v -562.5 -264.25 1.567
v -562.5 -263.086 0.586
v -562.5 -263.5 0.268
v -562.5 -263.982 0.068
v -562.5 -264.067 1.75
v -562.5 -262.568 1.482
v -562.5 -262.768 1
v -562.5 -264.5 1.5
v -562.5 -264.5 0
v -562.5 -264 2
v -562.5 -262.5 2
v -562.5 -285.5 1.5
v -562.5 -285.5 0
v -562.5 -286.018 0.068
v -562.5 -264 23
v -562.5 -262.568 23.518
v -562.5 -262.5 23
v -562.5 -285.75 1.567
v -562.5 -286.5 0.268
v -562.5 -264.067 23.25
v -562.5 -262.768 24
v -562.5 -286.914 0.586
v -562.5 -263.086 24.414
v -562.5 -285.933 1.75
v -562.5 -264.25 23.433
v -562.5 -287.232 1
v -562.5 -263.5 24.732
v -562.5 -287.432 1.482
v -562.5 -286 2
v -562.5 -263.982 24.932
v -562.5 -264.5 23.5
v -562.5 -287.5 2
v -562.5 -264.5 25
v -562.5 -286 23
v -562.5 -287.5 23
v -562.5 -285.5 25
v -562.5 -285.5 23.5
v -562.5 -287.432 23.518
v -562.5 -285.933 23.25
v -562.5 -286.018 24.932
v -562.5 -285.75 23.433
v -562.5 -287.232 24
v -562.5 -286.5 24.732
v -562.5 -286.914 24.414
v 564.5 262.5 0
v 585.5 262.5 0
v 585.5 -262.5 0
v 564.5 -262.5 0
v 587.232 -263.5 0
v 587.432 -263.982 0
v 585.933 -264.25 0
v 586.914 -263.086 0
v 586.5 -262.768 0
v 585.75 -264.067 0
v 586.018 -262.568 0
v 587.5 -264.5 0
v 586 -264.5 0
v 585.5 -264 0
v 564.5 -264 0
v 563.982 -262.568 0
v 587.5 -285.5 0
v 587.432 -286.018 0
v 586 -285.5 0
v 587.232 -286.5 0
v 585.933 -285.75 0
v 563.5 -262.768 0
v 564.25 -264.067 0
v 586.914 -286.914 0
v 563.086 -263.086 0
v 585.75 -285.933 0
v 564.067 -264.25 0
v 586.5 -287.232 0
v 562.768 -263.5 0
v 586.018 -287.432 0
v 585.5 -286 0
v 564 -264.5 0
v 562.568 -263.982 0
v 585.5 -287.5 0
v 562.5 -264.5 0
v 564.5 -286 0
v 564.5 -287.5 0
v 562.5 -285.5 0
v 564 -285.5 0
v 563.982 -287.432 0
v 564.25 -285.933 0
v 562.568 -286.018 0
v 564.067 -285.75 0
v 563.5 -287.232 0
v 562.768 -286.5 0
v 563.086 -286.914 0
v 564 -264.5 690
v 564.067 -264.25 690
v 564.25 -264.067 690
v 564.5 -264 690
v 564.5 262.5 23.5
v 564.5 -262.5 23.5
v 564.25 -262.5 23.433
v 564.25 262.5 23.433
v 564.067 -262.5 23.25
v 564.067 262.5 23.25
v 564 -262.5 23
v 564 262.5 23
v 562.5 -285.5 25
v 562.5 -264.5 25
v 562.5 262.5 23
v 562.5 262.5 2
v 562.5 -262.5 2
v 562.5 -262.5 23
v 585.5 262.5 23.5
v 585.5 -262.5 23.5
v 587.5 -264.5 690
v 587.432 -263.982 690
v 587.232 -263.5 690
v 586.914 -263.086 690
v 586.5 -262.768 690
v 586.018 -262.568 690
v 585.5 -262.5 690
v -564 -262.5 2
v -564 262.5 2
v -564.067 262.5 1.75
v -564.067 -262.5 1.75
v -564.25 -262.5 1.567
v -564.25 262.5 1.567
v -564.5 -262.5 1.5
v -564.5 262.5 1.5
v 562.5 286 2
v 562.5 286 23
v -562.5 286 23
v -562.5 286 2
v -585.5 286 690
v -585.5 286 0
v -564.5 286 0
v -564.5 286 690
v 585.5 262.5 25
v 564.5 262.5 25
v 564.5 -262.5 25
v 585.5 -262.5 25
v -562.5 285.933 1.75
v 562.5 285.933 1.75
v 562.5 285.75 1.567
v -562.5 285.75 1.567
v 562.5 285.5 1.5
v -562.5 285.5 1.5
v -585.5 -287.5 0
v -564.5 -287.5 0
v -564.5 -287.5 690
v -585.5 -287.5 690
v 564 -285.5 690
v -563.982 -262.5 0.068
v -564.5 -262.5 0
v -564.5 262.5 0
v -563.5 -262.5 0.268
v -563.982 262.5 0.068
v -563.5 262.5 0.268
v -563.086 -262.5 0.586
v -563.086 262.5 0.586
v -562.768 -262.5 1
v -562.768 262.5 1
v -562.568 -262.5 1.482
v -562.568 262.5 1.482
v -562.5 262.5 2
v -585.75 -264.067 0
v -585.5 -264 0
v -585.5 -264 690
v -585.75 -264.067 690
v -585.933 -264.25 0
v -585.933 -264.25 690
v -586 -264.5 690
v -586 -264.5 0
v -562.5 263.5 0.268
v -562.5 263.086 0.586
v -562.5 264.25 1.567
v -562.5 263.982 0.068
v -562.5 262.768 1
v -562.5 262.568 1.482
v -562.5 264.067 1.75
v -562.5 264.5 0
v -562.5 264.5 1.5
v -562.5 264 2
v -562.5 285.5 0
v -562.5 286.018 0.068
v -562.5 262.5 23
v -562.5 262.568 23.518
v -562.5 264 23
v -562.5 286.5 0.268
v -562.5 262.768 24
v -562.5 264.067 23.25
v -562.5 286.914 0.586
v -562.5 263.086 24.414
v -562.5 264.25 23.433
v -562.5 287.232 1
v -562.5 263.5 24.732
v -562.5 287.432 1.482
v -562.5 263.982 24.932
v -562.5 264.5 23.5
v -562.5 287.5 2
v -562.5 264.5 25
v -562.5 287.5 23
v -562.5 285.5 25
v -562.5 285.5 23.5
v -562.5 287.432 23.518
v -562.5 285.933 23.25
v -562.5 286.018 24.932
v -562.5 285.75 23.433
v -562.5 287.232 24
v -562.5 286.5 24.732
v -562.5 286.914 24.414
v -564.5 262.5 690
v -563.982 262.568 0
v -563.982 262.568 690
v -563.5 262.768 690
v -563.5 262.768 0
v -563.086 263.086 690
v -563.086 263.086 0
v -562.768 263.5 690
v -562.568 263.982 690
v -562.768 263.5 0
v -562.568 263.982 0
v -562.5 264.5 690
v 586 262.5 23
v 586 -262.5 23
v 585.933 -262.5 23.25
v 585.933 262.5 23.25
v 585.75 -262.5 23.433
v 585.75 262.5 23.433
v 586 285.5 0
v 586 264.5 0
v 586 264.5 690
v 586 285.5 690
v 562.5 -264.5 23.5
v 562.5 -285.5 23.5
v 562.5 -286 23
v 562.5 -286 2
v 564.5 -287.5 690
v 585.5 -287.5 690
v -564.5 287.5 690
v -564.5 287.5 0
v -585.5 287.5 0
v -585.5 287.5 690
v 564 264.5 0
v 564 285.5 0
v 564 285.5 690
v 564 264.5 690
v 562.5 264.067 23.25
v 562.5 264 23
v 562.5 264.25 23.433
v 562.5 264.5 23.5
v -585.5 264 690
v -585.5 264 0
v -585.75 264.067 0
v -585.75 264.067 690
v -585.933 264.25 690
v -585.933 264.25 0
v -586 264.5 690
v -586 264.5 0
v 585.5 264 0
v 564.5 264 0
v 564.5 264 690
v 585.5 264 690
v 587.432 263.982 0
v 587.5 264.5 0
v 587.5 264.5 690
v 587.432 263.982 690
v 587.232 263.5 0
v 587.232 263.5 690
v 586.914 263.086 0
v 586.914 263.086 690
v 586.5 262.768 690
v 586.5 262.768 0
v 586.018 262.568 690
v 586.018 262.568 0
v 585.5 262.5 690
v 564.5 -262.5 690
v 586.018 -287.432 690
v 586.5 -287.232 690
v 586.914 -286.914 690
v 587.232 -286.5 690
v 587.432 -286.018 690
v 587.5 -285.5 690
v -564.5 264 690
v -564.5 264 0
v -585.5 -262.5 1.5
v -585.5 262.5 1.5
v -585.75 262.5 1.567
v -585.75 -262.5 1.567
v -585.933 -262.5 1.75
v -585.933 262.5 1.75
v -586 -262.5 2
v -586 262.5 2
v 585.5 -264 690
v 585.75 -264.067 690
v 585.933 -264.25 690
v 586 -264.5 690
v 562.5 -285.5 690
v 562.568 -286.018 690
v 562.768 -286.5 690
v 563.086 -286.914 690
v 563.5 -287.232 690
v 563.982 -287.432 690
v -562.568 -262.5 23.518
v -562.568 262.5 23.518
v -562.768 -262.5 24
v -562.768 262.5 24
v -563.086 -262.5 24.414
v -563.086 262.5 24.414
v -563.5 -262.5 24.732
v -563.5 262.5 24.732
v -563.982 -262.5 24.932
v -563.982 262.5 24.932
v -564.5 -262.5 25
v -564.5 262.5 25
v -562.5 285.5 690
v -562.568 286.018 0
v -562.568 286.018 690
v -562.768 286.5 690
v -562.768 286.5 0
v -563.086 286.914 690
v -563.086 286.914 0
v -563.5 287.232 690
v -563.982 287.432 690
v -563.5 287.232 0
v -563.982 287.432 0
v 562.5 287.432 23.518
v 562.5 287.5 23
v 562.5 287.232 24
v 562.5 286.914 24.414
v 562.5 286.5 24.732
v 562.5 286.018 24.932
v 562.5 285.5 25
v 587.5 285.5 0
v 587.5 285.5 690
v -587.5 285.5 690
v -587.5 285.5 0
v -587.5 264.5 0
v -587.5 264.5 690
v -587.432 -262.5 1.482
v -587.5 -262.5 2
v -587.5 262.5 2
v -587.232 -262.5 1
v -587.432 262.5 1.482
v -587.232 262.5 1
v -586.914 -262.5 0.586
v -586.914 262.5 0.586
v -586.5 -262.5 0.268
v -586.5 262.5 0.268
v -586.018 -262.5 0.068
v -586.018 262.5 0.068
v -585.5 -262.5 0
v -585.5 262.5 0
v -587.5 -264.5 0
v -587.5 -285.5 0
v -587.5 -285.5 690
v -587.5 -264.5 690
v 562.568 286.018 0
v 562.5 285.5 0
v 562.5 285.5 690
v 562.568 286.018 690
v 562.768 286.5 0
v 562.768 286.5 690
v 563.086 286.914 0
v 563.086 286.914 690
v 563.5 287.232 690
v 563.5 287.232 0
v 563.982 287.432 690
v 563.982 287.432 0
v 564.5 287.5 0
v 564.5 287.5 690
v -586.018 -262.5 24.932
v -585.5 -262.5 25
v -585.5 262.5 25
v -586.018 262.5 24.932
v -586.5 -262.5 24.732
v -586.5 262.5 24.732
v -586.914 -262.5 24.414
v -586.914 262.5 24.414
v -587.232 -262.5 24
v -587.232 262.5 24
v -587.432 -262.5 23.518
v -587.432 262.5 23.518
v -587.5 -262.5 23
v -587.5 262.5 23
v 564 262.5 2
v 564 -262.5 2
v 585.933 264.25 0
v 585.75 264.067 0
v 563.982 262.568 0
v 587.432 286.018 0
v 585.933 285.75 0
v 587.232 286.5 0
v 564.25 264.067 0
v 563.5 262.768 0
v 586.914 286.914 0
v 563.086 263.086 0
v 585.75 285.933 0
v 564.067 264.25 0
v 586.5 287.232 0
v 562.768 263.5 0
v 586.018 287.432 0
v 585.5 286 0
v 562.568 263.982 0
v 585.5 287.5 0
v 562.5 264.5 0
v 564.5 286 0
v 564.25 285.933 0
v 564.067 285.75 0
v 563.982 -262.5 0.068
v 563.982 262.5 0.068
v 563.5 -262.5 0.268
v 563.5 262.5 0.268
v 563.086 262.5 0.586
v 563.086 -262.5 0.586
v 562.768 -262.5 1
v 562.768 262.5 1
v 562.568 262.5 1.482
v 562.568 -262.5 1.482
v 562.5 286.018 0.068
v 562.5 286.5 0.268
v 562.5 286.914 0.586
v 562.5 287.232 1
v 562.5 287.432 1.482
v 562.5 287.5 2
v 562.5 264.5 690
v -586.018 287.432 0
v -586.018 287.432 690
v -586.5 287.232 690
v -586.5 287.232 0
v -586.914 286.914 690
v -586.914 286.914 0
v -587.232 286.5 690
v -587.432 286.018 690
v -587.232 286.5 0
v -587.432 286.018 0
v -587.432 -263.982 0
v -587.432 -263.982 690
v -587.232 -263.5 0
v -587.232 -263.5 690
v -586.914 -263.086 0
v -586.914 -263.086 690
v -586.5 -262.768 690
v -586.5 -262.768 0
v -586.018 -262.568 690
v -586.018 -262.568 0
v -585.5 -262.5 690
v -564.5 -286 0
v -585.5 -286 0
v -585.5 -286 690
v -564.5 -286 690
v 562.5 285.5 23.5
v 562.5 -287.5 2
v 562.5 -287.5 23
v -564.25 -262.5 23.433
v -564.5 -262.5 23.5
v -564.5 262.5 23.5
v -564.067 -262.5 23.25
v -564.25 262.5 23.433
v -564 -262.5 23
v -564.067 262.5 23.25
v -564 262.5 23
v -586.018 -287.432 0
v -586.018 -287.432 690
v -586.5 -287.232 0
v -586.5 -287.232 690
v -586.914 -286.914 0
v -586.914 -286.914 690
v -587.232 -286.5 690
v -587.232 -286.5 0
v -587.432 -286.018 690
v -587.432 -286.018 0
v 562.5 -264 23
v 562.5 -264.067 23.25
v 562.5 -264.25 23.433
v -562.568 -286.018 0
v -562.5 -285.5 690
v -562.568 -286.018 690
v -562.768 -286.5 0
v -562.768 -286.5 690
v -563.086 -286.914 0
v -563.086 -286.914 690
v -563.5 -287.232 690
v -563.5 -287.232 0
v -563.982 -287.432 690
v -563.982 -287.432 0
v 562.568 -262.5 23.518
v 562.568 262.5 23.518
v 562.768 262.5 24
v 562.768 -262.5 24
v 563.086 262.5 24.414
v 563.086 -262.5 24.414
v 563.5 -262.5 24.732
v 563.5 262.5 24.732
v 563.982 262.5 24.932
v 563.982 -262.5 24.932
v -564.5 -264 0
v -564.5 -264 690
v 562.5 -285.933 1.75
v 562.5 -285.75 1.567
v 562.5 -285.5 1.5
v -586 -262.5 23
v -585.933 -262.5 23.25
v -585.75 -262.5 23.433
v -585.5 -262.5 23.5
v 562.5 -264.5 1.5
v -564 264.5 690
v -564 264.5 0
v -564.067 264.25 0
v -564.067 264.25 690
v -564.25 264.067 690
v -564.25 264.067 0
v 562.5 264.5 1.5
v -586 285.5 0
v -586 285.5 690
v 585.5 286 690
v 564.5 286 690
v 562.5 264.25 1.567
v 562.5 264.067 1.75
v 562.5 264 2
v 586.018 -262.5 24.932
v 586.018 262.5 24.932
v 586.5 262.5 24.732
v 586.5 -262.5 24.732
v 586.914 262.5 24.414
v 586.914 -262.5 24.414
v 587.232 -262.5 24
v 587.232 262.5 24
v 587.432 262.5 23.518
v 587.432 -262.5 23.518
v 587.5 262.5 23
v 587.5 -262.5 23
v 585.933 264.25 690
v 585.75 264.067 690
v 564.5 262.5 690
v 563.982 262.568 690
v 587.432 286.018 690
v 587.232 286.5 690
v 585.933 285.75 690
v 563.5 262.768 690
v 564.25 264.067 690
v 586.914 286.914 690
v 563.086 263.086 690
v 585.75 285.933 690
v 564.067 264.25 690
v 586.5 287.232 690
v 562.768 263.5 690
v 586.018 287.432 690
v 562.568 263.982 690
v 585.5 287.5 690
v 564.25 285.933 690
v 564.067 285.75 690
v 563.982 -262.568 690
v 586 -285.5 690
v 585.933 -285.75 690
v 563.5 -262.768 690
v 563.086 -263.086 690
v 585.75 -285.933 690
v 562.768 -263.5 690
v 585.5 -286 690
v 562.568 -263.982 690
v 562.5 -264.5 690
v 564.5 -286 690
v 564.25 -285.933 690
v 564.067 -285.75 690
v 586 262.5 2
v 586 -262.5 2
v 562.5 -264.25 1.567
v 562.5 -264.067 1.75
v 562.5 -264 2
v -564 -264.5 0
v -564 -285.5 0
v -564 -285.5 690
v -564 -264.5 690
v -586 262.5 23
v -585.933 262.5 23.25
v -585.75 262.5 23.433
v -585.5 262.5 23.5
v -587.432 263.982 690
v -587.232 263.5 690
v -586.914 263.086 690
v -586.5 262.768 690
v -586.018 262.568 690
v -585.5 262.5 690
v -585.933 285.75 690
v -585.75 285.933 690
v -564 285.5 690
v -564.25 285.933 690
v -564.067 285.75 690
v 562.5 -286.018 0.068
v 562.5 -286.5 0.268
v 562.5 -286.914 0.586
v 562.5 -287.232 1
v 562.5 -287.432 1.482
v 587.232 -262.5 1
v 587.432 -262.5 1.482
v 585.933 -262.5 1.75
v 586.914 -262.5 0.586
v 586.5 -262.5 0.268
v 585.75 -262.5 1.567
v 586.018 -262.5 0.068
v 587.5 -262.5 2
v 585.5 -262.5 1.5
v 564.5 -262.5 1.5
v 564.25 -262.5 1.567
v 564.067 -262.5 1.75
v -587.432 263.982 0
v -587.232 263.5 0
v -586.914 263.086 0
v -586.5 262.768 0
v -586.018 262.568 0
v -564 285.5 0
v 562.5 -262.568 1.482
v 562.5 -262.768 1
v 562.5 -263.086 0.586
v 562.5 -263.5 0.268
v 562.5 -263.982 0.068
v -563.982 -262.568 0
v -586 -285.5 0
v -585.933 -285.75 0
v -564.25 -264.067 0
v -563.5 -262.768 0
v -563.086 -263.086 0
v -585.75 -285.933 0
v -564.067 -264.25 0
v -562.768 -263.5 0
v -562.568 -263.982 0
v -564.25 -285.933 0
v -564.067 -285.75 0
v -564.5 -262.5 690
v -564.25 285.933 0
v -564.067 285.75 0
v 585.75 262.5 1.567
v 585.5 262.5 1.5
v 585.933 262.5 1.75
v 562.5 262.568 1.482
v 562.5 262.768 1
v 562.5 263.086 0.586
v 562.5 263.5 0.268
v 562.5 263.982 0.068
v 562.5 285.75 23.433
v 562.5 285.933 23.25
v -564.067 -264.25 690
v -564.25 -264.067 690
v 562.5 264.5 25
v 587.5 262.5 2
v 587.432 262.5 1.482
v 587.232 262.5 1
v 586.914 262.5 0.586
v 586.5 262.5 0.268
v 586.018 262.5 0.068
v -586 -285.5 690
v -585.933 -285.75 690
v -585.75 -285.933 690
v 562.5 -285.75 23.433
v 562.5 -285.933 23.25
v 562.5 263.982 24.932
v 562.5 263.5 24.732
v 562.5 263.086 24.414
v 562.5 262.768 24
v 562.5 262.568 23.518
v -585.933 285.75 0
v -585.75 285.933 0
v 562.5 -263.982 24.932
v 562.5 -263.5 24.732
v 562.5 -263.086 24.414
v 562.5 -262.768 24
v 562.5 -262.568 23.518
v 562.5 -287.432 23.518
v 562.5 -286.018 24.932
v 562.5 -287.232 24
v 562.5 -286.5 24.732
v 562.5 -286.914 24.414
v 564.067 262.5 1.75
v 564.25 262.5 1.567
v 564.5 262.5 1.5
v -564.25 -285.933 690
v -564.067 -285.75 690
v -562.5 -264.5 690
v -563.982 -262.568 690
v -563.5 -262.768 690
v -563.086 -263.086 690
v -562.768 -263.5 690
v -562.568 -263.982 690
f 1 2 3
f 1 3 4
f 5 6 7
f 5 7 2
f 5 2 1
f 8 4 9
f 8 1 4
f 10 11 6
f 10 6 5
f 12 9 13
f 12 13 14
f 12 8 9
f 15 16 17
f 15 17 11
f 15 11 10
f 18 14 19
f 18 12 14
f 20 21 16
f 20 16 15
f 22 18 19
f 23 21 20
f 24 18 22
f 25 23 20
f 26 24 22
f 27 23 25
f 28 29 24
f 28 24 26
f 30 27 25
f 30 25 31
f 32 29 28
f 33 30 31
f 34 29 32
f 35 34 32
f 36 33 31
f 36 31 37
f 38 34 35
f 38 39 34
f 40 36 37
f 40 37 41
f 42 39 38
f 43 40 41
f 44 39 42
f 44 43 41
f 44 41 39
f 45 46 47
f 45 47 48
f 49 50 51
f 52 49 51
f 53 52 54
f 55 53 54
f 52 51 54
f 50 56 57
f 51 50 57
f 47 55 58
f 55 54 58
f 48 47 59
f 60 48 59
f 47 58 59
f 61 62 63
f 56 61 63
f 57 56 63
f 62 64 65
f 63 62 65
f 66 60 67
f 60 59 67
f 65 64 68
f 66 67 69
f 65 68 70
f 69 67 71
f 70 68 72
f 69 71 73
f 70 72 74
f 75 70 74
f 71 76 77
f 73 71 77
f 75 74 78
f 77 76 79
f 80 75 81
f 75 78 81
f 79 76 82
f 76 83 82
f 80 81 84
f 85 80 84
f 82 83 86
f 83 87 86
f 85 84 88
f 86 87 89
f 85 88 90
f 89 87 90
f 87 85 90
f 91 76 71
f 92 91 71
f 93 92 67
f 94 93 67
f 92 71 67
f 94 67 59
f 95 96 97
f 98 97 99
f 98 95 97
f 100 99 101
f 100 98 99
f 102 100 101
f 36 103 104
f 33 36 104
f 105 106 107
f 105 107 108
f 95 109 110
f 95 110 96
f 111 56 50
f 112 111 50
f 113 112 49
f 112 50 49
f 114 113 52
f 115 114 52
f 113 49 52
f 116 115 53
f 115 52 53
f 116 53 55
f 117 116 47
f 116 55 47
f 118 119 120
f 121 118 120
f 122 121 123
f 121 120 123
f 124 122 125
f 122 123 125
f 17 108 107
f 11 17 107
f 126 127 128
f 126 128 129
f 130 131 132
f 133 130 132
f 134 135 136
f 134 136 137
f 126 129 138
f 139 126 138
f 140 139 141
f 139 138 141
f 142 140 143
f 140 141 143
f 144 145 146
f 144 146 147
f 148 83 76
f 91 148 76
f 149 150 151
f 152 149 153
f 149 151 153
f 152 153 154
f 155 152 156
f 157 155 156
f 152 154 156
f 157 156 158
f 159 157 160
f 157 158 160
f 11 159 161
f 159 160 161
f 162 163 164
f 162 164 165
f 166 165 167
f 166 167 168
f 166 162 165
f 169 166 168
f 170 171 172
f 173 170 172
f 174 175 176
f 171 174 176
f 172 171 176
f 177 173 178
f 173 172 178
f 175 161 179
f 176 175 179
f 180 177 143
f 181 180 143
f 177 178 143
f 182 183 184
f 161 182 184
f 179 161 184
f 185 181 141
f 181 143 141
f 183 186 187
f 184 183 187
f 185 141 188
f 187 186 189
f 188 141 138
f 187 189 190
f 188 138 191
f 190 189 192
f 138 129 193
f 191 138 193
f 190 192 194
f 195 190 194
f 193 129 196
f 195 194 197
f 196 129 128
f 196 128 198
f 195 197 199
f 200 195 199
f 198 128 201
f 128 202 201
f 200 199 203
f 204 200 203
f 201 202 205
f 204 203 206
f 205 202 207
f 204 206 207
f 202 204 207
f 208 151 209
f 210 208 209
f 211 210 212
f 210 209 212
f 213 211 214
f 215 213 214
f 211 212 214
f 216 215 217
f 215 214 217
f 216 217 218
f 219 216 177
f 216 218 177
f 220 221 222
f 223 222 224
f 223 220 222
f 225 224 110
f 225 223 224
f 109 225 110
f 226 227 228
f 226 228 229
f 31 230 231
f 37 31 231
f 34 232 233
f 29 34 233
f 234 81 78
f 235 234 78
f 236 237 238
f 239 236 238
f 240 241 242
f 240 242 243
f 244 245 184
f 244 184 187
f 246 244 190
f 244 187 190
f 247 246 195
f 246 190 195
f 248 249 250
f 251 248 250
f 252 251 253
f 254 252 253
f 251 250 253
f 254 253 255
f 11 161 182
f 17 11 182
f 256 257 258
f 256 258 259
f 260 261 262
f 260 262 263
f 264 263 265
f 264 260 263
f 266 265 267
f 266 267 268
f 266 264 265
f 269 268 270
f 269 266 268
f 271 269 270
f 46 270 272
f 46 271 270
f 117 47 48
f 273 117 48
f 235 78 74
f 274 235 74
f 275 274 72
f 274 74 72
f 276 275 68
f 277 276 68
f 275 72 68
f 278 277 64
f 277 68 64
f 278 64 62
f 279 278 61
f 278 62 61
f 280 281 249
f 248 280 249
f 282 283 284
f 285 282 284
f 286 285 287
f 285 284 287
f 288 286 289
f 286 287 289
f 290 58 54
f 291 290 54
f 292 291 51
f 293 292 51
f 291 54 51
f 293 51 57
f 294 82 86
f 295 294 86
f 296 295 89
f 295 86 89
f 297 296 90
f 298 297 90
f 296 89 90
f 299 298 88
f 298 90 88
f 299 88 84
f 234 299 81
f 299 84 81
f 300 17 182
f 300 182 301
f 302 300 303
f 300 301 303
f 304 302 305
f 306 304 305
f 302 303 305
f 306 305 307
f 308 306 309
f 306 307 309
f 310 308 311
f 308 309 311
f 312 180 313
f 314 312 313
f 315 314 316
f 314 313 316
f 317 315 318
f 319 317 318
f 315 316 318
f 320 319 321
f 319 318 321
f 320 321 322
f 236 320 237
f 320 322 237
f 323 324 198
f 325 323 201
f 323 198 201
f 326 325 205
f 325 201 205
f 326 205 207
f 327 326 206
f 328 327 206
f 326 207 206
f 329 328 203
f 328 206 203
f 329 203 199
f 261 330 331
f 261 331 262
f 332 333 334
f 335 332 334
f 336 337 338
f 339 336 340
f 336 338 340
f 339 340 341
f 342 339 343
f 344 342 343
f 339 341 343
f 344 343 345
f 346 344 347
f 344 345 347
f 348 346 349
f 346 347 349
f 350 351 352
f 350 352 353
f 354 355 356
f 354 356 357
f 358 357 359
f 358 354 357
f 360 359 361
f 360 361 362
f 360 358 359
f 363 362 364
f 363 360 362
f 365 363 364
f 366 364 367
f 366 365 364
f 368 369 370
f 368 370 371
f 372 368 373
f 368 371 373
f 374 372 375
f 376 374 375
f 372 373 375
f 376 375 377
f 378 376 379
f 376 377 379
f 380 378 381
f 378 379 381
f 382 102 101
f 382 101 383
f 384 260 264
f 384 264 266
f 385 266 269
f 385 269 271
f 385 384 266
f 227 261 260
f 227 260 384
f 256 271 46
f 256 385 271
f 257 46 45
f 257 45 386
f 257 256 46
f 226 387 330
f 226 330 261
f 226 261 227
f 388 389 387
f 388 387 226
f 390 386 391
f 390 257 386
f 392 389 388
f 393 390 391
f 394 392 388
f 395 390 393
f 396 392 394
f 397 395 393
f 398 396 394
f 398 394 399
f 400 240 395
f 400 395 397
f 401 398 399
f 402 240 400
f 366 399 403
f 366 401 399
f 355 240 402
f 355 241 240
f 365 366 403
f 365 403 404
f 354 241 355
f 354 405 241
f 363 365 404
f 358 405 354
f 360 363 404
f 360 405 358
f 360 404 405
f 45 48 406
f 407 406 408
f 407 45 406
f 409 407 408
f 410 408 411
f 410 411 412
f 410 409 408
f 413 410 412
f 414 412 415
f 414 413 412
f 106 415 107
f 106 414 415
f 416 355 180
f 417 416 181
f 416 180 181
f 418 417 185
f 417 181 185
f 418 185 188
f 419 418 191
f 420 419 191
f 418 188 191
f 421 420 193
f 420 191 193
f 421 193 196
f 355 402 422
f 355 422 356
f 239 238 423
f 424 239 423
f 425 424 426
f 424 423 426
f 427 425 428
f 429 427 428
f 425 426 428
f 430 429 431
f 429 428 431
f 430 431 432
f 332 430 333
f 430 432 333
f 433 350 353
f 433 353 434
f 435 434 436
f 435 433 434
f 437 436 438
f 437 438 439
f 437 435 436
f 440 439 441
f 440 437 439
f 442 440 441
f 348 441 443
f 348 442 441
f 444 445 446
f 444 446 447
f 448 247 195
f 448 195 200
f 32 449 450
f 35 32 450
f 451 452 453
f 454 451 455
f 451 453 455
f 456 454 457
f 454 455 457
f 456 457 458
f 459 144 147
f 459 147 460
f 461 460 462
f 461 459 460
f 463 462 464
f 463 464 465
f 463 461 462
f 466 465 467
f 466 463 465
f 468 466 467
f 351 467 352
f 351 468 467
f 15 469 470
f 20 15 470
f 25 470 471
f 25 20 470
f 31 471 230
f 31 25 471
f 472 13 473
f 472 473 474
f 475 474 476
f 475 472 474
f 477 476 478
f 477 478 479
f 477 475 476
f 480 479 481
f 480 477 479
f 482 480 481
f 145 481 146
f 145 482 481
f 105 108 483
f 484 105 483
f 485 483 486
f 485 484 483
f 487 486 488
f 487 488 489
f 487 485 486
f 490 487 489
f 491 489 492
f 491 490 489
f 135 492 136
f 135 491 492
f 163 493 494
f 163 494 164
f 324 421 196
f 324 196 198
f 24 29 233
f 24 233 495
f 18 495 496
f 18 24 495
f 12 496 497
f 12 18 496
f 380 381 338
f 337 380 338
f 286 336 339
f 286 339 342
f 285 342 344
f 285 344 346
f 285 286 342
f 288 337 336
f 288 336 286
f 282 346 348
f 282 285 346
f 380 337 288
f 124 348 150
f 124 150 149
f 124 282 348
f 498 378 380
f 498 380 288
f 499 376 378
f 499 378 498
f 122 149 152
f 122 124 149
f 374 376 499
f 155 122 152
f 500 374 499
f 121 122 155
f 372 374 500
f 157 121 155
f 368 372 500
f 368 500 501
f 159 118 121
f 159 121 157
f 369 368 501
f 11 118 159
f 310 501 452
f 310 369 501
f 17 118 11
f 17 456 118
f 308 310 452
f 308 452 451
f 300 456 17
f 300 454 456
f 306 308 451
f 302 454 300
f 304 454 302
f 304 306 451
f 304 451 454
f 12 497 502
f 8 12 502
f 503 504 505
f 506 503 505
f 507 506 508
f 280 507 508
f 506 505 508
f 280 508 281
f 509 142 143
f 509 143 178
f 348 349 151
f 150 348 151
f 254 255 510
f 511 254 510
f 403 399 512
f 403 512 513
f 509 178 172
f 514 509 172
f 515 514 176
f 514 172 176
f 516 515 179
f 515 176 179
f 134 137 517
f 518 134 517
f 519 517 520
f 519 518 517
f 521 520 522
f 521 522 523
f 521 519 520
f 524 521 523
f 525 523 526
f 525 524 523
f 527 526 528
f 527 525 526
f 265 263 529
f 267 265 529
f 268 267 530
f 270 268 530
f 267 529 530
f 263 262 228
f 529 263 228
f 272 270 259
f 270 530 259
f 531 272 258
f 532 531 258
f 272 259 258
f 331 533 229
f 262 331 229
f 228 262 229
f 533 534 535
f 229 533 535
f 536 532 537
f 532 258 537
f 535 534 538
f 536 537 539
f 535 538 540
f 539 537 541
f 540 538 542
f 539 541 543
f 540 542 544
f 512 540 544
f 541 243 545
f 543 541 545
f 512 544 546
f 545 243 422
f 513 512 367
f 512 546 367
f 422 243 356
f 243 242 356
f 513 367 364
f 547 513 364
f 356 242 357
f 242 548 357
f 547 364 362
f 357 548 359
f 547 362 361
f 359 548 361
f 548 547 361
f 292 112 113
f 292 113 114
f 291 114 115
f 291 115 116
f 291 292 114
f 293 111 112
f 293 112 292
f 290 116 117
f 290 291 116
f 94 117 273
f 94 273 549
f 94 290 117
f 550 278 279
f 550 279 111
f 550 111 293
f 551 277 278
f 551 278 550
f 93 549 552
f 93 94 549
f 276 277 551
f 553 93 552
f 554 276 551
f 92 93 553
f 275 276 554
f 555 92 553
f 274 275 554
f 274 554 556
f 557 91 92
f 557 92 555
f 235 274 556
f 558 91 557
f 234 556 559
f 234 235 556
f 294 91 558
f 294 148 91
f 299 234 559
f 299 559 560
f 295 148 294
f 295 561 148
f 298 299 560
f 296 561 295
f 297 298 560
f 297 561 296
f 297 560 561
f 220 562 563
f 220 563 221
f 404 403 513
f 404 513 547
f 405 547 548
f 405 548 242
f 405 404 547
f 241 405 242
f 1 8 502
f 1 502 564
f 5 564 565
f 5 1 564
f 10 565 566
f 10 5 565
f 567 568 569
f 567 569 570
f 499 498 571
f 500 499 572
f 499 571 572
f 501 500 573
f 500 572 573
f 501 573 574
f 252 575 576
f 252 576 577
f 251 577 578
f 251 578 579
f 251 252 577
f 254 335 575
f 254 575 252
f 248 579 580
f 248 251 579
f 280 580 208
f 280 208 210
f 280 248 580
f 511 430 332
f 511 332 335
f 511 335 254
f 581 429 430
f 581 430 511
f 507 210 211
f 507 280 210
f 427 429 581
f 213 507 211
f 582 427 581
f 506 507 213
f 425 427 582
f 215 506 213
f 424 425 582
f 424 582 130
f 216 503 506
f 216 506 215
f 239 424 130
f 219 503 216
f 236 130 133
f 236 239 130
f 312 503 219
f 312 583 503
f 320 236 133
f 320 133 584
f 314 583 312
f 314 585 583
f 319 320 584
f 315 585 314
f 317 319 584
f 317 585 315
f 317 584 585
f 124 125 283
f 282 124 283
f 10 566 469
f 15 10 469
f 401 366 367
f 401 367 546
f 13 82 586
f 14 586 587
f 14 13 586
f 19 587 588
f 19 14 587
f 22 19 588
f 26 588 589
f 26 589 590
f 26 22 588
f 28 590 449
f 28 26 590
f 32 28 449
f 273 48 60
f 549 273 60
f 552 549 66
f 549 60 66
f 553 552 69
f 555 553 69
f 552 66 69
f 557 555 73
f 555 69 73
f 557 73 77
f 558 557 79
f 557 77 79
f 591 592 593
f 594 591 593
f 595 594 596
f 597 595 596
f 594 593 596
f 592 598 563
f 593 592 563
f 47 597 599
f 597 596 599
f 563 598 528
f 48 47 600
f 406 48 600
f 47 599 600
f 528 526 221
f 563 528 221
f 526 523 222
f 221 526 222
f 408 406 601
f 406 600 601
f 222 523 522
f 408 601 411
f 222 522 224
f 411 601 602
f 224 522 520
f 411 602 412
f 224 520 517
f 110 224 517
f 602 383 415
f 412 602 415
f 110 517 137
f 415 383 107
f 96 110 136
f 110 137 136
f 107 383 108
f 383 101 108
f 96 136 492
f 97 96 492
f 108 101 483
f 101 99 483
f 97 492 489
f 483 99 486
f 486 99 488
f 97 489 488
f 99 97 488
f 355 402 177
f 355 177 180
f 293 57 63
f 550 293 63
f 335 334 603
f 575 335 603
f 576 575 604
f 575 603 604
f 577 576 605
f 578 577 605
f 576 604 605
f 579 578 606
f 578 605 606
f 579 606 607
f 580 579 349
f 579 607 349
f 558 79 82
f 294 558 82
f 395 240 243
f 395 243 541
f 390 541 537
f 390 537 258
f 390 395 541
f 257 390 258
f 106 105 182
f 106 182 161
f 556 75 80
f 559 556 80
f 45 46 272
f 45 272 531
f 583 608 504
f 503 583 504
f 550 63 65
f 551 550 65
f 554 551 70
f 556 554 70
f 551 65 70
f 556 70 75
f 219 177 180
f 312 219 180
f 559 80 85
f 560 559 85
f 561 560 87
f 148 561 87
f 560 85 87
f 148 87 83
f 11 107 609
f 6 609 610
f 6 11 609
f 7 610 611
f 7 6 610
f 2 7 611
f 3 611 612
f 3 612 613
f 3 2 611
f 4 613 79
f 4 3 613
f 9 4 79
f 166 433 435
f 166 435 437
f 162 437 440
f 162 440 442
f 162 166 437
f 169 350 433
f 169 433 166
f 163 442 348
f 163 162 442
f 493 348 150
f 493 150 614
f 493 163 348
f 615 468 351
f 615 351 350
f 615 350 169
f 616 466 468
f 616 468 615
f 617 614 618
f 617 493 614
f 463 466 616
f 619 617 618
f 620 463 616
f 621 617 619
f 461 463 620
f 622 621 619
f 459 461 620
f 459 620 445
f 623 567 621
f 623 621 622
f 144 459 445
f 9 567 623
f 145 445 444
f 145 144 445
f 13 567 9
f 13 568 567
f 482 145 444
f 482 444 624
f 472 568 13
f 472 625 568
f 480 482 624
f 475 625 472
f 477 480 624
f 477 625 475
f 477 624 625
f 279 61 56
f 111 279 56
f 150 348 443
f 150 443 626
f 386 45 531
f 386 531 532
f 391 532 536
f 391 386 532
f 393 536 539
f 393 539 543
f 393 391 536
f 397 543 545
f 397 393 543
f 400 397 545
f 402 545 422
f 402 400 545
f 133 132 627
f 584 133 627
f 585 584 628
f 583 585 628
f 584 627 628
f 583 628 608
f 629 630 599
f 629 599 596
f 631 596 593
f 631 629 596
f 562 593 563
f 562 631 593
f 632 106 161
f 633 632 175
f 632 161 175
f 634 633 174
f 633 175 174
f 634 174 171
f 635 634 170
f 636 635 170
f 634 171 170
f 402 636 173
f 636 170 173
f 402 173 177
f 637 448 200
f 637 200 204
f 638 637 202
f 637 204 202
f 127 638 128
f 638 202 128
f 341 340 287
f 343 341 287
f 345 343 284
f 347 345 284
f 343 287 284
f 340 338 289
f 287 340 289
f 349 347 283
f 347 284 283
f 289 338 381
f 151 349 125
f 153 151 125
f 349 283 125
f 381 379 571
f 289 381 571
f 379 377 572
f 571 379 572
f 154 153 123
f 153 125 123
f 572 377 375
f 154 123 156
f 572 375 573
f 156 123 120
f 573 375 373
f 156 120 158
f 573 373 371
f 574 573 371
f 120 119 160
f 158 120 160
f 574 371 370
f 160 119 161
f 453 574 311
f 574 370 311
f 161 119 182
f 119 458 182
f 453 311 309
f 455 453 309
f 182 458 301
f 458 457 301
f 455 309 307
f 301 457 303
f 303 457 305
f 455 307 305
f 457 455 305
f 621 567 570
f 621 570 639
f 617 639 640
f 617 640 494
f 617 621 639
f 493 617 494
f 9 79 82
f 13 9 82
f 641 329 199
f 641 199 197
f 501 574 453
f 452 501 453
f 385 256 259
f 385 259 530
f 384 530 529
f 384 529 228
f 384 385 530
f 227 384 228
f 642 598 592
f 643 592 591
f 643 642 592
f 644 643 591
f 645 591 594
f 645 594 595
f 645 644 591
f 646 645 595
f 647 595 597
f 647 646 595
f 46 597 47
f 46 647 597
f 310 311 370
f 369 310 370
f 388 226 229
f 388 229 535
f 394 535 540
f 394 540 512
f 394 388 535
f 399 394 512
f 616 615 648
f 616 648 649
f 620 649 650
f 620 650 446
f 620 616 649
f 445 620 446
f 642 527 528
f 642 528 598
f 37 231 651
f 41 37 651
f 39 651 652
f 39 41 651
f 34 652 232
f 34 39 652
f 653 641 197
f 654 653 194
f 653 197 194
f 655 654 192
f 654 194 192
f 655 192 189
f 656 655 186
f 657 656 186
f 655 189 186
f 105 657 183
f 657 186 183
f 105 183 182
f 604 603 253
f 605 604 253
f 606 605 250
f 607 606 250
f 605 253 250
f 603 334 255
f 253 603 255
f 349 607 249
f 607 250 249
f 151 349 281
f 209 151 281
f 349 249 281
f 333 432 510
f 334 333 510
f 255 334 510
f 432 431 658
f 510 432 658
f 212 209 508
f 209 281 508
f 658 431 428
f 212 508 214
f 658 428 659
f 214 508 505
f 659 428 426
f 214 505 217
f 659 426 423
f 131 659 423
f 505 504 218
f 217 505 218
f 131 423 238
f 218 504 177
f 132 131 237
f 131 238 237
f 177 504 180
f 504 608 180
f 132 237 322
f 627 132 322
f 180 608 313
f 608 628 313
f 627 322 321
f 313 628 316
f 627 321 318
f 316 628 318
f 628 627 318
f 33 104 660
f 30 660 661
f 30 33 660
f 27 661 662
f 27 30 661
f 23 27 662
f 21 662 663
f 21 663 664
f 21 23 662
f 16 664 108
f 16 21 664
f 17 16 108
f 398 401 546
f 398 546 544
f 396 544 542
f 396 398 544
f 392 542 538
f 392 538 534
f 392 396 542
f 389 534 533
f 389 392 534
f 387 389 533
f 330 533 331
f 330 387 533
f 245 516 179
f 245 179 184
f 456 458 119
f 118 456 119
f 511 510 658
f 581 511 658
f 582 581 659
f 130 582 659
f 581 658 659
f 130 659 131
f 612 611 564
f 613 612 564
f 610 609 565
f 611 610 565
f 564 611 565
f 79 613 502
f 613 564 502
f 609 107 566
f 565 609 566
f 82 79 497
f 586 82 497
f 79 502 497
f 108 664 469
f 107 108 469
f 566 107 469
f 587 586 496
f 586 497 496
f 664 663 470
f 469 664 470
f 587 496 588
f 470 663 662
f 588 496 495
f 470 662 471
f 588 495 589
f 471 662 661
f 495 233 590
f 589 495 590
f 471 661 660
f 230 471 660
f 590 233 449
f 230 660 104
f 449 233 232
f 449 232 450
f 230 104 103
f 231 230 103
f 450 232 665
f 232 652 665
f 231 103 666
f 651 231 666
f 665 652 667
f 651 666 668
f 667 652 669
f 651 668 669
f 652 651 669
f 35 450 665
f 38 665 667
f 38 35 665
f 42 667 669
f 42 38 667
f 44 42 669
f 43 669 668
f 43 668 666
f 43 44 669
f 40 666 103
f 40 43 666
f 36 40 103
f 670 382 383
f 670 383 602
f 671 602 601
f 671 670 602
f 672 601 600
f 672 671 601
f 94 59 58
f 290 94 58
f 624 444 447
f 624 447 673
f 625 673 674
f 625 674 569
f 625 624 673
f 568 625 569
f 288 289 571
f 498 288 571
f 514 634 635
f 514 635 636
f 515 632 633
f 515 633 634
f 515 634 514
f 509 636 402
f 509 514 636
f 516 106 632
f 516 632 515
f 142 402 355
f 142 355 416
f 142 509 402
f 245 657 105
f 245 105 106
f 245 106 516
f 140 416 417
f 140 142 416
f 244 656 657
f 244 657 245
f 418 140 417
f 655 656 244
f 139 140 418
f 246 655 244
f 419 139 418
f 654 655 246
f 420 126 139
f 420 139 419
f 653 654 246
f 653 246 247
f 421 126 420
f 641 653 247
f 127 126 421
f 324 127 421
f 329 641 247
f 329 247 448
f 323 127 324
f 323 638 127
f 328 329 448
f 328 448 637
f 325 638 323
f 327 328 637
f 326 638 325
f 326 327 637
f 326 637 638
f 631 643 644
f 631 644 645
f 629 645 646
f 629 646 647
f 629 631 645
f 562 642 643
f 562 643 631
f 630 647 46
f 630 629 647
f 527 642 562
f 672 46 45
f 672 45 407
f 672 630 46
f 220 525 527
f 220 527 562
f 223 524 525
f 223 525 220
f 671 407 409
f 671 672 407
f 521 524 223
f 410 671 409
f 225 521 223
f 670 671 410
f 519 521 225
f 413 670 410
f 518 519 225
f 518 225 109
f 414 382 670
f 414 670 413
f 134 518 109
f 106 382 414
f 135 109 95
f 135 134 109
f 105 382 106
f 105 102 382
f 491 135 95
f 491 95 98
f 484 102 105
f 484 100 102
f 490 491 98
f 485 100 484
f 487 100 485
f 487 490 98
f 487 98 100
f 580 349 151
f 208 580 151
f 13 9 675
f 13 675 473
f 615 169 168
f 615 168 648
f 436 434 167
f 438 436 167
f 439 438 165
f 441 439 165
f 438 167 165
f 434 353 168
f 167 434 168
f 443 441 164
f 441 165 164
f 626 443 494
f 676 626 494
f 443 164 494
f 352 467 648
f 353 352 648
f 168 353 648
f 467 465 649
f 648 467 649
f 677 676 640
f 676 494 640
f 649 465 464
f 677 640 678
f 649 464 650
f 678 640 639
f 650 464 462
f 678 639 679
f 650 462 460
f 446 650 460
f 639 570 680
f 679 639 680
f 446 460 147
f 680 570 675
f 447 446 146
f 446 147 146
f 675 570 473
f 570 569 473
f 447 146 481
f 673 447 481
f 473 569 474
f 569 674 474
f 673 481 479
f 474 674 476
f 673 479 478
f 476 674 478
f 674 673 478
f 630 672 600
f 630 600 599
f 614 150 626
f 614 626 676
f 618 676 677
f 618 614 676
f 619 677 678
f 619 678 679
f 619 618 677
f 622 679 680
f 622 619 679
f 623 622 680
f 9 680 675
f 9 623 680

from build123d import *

# Parameters (mm, degrees)
F3_DEPTH = 690
F5_DEPTH = 1125
F7_DEPTH = 525


with BuildPart() as f3:
    # F2 (on Top) → F3 (new body)
    with BuildSketch(Plane.XY):
        with BuildLine():
            Line((-564.5, 287.5), (-585.5, 287.5))
            ThreePointArc((-585.5, 287.5), (-586.9142135624, 286.9142135624), (-587.5, 285.5))
            Line((-587.5, 285.5), (-587.5, 264.5))
            ThreePointArc((-587.5, 264.5), (-586.9142135624, 263.0857864376), (-585.5, 262.5))
            Line((-585.5, 262.5), (-564.5, 262.5))
            ThreePointArc((-564.5, 262.5), (-563.0857864376, 263.0857864376), (-562.5, 264.5))
            Line((-562.5, 264.5), (-562.5, 285.5))
            ThreePointArc((-562.5, 285.5), (-563.0857864376, 286.9142135624), (-564.5, 287.5))
        make_face()
        with BuildLine():
            ThreePointArc((-586, 285.5), (-585.8535533906, 285.8535533906), (-585.5, 286))
            Line((-585.5, 286), (-564.5, 286))
            ThreePointArc((-564.5, 286), (-564.1464466094, 285.8535533906), (-564, 285.5))
            Line((-564, 285.5), (-564, 264.5))
            ThreePointArc((-564, 264.5), (-564.1464466094, 264.1464466094), (-564.5, 264))
            Line((-564.5, 264), (-585.5, 264))
            ThreePointArc((-585.5, 264), (-585.8535533906, 264.1464466094), (-586, 264.5))
            Line((-586, 264.5), (-586, 285.5))
        make_face(mode=Mode.SUBTRACT)
    extrude(amount=F3_DEPTH)


with BuildPart() as f5:
    # F4 (on face) → F5 (new body, through all)
    with BuildSketch(Plane.YZ.offset(-562.5)):
        with BuildLine():
            Line((285.5, 25), (264.5, 25))
            ThreePointArc((264.5, 25), (263.0857864376, 24.4142135624), (262.5, 23))
            Line((262.5, 23), (262.5, 2))
            ThreePointArc((262.5, 2), (263.0857864376, 0.5857864376), (264.5, 0))
            Line((264.5, 0), (285.5, 0))
            ThreePointArc((285.5, 0), (286.9142135624, 0.5857864376), (287.5, 2))
            Line((287.5, 2), (287.5, 23))
            ThreePointArc((287.5, 23), (286.9142135624, 24.4142135624), (285.5, 25))
        make_face()
        with BuildLine():
            ThreePointArc((264, 23), (264.1464466094, 23.3535533906), (264.5, 23.5))
            Line((264.5, 23.5), (285.5, 23.5))
            ThreePointArc((285.5, 23.5), (285.8535533906, 23.3535533906), (286, 23))
            Line((286, 23), (286, 2))
            ThreePointArc((286, 2), (285.8535533906, 1.6464466094), (285.5, 1.5))
            Line((285.5, 1.5), (264.5, 1.5))
            ThreePointArc((264.5, 1.5), (264.1464466094, 1.6464466094), (264, 2))
            Line((264, 2), (264, 23))
        make_face(mode=Mode.SUBTRACT)
    extrude(amount=F5_DEPTH)


with BuildPart() as f7:
    # F6 (on face) → F7 (new body, through all)
    with BuildSketch(Plane.XZ.offset(-262.5)):
        with BuildLine():
            Line((-564.5, 25), (-585.5, 25))
            ThreePointArc((-585.5, 25), (-586.9142135624, 24.4142135624), (-587.5, 23))
            Line((-587.5, 23), (-587.5, 2))
            ThreePointArc((-587.5, 2), (-586.9142135624, 0.5857864376), (-585.5, 0))
            Line((-585.5, 0), (-564.5, 0))
            ThreePointArc((-564.5, 0), (-563.0857864376, 0.5857864376), (-562.5, 2))
            Line((-562.5, 2), (-562.5, 23))
            ThreePointArc((-562.5, 23), (-563.0857864376, 24.4142135624), (-564.5, 25))
        make_face()
        with BuildLine():
            ThreePointArc((-586, 23), (-585.8535533906, 23.3535533906), (-585.5, 23.5))
            Line((-585.5, 23.5), (-564.5, 23.5))
            ThreePointArc((-564.5, 23.5), (-564.1464466094, 23.3535533906), (-564, 23))
            Line((-564, 23), (-564, 2))
            ThreePointArc((-564, 2), (-564.1464466094, 1.6464466094), (-564.5, 1.5))
            Line((-564.5, 1.5), (-585.5, 1.5))
            ThreePointArc((-585.5, 1.5), (-585.8535533906, 1.6464466094), (-586, 2))
            Line((-586, 2), (-586, 23))
        make_face(mode=Mode.SUBTRACT)
    extrude(amount=F7_DEPTH)


with BuildPart() as f8_1:
    # F8: instance of F3
    add(f3.part.mirror(Plane.YZ))


with BuildPart() as f8_2:
    # F8: instance of F7
    add(f7.part.mirror(Plane.YZ))


with BuildPart() as f9_1:
    # F9: instance of F5
    add(f5.part.mirror(Plane.XZ))


with BuildPart() as f9_2:
    # F9: instance of F3
    add(f3.part.mirror(Plane.XZ))


with BuildPart() as f9_3:
    # F9: instance of F8_1
    add(f8_1.part.mirror(Plane.XZ))


solid = Compound([f3.part, f5.part, f7.part, f8_1.part, f8_2.part, f9_1.part, f9_2.part, f9_3.part])
